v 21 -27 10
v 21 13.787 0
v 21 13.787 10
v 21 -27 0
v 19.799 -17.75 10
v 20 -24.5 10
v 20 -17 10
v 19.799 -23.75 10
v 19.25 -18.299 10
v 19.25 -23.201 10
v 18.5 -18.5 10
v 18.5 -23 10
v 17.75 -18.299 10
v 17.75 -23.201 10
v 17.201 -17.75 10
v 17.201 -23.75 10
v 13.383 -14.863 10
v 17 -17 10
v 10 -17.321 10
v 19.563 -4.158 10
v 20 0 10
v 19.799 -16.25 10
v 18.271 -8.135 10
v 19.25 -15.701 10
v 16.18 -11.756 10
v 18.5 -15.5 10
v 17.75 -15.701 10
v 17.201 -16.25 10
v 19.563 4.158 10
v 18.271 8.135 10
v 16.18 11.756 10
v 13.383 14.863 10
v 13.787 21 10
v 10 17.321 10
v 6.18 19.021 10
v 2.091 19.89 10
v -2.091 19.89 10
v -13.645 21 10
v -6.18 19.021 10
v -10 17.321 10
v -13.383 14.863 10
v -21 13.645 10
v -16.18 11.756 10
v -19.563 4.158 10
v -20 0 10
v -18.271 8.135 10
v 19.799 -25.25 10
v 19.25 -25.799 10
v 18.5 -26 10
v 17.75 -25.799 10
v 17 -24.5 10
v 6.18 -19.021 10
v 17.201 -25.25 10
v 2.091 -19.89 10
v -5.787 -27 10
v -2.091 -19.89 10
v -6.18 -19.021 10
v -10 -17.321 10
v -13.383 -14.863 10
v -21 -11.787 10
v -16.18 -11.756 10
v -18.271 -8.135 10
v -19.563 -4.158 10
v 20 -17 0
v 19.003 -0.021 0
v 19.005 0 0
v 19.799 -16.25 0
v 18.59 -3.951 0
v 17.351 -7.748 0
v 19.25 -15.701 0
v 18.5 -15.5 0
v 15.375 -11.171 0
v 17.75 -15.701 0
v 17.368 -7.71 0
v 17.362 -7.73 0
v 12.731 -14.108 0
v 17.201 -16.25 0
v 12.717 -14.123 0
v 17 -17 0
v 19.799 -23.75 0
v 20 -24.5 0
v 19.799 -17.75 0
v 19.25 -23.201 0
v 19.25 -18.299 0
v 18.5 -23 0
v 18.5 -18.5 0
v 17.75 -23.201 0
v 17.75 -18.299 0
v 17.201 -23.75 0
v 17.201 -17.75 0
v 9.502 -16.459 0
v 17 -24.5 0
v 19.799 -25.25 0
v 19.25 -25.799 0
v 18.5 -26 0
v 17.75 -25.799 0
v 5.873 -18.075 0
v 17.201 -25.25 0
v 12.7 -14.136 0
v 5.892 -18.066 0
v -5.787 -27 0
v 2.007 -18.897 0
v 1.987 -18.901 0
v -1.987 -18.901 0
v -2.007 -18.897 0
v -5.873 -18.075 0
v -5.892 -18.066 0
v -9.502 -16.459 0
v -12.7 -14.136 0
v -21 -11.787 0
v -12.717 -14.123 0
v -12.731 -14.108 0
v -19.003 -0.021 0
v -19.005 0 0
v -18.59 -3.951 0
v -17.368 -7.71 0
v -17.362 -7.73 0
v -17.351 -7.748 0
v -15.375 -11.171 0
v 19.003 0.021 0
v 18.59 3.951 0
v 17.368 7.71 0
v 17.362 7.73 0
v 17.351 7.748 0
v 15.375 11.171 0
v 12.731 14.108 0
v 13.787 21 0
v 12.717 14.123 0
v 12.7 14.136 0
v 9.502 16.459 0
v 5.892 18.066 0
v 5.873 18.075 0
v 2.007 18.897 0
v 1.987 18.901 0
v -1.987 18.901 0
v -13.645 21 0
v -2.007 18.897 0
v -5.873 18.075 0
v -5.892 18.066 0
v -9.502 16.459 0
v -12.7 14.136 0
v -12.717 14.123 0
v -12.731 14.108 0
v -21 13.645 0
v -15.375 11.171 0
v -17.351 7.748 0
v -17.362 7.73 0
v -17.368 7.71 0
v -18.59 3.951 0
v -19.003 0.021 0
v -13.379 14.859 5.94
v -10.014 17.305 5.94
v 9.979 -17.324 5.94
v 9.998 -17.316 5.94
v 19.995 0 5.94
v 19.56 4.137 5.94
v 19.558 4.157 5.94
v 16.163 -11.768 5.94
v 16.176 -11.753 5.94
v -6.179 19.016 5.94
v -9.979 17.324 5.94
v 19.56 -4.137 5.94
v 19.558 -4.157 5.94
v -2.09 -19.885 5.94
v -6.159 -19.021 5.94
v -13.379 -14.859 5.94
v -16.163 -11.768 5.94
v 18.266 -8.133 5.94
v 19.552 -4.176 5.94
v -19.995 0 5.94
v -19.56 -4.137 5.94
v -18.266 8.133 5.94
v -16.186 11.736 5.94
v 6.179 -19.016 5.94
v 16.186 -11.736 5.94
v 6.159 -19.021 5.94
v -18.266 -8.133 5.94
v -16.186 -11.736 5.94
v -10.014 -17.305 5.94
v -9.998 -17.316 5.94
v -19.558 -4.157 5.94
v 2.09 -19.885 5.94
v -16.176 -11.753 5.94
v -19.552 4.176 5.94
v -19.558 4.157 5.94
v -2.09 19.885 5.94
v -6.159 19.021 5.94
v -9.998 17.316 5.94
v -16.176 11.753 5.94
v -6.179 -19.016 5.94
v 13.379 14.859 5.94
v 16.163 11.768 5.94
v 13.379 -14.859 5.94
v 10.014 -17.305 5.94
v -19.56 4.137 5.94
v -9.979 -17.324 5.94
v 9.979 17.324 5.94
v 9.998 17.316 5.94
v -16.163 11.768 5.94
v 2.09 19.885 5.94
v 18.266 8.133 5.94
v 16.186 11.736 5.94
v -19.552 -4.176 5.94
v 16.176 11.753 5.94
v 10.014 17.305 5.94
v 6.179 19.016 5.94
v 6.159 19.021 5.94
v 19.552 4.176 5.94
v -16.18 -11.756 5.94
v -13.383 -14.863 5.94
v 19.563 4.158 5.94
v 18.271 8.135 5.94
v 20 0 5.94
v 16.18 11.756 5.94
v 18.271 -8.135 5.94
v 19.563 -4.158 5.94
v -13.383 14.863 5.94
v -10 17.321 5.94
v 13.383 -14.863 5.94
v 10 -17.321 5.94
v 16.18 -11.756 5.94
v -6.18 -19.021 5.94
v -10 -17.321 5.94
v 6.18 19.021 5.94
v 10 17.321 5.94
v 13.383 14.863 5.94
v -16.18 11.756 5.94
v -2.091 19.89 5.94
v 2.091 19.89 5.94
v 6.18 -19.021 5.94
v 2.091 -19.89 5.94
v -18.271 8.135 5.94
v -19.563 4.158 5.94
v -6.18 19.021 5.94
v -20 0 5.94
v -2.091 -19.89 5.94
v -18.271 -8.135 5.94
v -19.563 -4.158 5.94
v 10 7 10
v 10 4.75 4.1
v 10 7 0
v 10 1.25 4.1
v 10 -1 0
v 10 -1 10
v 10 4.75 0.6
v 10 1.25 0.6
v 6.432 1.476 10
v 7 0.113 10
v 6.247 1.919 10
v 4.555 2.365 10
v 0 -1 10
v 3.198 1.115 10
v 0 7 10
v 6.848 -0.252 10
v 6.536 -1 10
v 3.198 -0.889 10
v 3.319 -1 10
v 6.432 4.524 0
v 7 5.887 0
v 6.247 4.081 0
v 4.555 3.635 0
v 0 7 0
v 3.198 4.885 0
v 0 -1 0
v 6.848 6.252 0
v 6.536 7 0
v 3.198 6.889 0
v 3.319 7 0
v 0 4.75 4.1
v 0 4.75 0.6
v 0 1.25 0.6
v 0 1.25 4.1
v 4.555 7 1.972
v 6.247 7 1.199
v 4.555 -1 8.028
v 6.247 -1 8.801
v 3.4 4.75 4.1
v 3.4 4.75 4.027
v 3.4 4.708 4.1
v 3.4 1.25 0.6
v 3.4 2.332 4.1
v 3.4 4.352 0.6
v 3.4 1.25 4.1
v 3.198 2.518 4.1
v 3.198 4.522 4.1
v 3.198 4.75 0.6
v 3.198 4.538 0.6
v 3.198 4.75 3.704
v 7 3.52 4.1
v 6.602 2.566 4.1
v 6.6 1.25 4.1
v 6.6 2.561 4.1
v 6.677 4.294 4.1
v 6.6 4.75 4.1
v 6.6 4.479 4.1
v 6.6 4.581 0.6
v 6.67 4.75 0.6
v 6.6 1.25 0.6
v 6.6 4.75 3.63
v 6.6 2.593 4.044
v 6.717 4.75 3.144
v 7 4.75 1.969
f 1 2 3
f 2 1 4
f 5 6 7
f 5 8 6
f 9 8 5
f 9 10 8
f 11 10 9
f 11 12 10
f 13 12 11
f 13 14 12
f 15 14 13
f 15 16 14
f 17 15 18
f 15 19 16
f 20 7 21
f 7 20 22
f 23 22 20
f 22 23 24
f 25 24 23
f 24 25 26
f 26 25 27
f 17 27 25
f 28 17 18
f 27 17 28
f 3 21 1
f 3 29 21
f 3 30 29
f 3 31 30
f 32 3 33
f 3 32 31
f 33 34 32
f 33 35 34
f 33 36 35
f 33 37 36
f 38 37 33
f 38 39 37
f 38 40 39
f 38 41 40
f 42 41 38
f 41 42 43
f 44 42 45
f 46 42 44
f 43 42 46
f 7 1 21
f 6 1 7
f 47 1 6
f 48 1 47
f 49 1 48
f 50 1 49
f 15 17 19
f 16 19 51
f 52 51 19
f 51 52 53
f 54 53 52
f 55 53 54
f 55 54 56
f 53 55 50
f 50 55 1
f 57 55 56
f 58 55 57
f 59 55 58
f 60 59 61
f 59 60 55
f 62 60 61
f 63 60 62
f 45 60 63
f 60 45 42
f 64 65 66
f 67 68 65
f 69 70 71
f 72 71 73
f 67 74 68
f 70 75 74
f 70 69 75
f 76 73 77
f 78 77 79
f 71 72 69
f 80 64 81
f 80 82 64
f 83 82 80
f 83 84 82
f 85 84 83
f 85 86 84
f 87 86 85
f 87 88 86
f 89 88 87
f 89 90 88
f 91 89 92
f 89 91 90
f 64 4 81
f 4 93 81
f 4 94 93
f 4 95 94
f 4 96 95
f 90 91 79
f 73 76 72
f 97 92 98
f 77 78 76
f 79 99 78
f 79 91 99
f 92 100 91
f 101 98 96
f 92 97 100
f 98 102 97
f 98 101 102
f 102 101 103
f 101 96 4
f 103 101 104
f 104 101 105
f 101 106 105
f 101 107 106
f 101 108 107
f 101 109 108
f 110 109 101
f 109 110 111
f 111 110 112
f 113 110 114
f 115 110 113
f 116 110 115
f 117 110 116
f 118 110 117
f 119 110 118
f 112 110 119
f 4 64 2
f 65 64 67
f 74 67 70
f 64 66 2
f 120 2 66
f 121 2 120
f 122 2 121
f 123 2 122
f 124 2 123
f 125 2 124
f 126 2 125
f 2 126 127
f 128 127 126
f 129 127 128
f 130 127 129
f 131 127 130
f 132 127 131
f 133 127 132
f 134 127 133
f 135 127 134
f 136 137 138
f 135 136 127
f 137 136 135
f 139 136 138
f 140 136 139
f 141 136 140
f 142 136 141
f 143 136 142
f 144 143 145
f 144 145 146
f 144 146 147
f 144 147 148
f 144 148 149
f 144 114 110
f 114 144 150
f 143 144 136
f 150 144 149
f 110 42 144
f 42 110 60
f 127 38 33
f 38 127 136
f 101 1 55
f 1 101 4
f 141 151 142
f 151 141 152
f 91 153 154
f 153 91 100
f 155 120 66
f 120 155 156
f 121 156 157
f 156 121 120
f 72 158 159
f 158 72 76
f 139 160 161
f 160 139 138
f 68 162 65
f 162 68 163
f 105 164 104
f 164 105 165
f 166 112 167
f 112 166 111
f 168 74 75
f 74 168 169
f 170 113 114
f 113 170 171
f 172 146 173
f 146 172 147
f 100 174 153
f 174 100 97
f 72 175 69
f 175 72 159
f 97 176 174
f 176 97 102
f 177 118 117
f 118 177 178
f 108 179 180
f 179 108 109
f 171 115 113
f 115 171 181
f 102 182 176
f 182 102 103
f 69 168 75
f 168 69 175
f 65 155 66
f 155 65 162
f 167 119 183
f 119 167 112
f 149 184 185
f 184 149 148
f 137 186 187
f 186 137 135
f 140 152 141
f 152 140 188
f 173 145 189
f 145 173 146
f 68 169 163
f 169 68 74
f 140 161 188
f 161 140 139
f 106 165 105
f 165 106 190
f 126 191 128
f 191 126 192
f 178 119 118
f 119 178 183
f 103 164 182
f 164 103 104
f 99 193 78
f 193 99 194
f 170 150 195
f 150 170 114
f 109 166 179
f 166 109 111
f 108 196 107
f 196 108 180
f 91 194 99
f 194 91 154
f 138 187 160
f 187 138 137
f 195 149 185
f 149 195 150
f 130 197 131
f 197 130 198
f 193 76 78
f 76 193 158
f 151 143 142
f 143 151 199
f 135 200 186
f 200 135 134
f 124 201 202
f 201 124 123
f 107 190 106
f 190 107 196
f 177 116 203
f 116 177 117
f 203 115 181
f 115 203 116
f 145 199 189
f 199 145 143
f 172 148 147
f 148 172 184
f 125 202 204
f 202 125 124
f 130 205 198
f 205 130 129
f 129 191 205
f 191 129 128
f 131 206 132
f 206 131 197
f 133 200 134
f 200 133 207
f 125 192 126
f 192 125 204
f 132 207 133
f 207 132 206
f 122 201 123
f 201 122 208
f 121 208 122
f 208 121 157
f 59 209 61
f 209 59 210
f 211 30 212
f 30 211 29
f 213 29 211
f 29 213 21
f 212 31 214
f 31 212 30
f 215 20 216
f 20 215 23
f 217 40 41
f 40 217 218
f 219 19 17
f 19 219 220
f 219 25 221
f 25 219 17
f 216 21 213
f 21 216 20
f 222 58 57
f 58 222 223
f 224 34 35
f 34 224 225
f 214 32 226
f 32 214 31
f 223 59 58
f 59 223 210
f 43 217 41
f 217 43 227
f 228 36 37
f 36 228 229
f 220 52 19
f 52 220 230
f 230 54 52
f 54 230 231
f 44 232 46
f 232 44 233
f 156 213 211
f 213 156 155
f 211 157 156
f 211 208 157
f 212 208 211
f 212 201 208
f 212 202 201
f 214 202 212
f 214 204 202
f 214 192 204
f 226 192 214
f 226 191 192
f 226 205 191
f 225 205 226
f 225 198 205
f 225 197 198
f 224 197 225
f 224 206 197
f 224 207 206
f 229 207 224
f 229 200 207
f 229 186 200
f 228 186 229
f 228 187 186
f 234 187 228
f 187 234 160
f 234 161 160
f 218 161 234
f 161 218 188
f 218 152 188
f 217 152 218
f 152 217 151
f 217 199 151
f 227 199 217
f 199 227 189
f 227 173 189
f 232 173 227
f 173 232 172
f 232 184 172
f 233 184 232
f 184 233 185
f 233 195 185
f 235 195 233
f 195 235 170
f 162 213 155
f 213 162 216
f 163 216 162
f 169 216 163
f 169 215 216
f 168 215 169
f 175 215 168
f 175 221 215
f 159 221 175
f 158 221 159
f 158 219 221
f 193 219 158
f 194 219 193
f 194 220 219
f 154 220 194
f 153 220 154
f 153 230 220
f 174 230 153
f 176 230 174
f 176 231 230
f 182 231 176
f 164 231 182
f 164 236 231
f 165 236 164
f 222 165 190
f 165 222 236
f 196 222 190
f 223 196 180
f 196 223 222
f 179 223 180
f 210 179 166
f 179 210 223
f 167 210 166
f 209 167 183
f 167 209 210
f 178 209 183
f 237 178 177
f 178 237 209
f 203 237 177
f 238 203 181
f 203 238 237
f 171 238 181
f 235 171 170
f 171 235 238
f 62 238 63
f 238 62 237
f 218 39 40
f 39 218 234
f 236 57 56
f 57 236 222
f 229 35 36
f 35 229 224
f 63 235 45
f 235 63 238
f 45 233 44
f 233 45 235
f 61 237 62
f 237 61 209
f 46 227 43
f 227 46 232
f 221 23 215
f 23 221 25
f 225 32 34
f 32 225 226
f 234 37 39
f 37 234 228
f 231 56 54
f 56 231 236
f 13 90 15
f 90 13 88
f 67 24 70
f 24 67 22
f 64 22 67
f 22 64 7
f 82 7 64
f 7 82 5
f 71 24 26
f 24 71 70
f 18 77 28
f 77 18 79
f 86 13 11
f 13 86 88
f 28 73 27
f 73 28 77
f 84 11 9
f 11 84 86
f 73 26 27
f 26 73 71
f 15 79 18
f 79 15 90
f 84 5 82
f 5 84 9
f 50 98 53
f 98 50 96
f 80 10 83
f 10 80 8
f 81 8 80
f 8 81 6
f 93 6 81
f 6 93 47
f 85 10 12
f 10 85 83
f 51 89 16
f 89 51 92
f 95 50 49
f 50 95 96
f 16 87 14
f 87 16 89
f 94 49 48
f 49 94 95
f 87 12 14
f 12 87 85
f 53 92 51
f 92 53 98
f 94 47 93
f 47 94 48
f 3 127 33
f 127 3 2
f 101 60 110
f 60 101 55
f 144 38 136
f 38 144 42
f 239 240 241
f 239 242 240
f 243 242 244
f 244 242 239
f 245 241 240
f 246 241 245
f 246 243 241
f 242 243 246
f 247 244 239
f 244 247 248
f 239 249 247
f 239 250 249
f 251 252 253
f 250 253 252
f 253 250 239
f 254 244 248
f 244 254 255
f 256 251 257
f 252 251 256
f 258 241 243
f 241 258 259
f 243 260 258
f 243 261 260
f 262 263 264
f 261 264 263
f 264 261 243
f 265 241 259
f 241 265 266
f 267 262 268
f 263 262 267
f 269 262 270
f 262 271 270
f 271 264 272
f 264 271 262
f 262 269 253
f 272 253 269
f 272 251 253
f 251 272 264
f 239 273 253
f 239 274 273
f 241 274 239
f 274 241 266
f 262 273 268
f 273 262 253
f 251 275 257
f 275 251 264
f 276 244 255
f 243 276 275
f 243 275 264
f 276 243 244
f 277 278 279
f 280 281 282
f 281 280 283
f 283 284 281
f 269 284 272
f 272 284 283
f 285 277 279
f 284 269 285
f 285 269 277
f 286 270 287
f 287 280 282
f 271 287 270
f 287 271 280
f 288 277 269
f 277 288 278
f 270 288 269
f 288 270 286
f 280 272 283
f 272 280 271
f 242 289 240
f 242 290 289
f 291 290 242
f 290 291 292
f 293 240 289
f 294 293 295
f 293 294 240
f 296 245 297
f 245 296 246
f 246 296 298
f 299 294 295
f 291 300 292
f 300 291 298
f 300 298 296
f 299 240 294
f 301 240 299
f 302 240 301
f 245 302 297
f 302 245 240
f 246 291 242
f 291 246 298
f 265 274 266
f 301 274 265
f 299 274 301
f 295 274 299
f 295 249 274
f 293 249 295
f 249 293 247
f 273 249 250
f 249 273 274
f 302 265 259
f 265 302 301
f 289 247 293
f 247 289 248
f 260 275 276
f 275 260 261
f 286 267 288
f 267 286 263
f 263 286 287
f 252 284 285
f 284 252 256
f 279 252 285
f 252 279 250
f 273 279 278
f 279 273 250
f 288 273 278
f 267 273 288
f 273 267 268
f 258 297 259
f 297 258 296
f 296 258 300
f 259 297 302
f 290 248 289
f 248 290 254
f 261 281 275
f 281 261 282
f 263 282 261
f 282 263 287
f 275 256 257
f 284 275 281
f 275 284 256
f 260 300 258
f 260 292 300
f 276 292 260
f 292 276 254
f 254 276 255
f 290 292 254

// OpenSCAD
module dishtrap(){
difference(){
translate([0,-3,5])cube([42,48,10],true);
translate([0,0,-0.03])cylinder(r1=37/2+0.5,r2=39/2+0.5,h=6);
translate([0,0,6-0.06])cylinder(r=39/2+0.5,h=6);
translate([18.5,-17,-0.5])cylinder(r=1.5,h=11,$fn=12);
translate([18.5,-24.5,-0.5])cylinder(r=1.5,h=11,$fn=12);
translate([28,28,5])rotate([0,0,45])cube(30,true);
translate([-27,-27,5])rotate([0,0,45])cube([30,50,30],true);
translate([-32,38,5])rotate([0,0,45])cube([30,50,30],true);
}
}
module magnetholder(){
difference(){
translate([0,-1,0])cube([10,8,10]);
translate([-0.1,3-3.5/2,0.6])cube([3.5,3.5,3.5]);
translate([10-3.4,3-3.5/2,0.6])cube([3.5,3.5,3.5]);
#translate([5,3,5])rotate([30,0,0])cylinder(r=2,h=20,center=true);
}
}
dishtrap();
magnetholder();
*translate([16,-15.75,15])rotate([0,0,-90])magnetholder();
%cube([200,200,0.01],true);
